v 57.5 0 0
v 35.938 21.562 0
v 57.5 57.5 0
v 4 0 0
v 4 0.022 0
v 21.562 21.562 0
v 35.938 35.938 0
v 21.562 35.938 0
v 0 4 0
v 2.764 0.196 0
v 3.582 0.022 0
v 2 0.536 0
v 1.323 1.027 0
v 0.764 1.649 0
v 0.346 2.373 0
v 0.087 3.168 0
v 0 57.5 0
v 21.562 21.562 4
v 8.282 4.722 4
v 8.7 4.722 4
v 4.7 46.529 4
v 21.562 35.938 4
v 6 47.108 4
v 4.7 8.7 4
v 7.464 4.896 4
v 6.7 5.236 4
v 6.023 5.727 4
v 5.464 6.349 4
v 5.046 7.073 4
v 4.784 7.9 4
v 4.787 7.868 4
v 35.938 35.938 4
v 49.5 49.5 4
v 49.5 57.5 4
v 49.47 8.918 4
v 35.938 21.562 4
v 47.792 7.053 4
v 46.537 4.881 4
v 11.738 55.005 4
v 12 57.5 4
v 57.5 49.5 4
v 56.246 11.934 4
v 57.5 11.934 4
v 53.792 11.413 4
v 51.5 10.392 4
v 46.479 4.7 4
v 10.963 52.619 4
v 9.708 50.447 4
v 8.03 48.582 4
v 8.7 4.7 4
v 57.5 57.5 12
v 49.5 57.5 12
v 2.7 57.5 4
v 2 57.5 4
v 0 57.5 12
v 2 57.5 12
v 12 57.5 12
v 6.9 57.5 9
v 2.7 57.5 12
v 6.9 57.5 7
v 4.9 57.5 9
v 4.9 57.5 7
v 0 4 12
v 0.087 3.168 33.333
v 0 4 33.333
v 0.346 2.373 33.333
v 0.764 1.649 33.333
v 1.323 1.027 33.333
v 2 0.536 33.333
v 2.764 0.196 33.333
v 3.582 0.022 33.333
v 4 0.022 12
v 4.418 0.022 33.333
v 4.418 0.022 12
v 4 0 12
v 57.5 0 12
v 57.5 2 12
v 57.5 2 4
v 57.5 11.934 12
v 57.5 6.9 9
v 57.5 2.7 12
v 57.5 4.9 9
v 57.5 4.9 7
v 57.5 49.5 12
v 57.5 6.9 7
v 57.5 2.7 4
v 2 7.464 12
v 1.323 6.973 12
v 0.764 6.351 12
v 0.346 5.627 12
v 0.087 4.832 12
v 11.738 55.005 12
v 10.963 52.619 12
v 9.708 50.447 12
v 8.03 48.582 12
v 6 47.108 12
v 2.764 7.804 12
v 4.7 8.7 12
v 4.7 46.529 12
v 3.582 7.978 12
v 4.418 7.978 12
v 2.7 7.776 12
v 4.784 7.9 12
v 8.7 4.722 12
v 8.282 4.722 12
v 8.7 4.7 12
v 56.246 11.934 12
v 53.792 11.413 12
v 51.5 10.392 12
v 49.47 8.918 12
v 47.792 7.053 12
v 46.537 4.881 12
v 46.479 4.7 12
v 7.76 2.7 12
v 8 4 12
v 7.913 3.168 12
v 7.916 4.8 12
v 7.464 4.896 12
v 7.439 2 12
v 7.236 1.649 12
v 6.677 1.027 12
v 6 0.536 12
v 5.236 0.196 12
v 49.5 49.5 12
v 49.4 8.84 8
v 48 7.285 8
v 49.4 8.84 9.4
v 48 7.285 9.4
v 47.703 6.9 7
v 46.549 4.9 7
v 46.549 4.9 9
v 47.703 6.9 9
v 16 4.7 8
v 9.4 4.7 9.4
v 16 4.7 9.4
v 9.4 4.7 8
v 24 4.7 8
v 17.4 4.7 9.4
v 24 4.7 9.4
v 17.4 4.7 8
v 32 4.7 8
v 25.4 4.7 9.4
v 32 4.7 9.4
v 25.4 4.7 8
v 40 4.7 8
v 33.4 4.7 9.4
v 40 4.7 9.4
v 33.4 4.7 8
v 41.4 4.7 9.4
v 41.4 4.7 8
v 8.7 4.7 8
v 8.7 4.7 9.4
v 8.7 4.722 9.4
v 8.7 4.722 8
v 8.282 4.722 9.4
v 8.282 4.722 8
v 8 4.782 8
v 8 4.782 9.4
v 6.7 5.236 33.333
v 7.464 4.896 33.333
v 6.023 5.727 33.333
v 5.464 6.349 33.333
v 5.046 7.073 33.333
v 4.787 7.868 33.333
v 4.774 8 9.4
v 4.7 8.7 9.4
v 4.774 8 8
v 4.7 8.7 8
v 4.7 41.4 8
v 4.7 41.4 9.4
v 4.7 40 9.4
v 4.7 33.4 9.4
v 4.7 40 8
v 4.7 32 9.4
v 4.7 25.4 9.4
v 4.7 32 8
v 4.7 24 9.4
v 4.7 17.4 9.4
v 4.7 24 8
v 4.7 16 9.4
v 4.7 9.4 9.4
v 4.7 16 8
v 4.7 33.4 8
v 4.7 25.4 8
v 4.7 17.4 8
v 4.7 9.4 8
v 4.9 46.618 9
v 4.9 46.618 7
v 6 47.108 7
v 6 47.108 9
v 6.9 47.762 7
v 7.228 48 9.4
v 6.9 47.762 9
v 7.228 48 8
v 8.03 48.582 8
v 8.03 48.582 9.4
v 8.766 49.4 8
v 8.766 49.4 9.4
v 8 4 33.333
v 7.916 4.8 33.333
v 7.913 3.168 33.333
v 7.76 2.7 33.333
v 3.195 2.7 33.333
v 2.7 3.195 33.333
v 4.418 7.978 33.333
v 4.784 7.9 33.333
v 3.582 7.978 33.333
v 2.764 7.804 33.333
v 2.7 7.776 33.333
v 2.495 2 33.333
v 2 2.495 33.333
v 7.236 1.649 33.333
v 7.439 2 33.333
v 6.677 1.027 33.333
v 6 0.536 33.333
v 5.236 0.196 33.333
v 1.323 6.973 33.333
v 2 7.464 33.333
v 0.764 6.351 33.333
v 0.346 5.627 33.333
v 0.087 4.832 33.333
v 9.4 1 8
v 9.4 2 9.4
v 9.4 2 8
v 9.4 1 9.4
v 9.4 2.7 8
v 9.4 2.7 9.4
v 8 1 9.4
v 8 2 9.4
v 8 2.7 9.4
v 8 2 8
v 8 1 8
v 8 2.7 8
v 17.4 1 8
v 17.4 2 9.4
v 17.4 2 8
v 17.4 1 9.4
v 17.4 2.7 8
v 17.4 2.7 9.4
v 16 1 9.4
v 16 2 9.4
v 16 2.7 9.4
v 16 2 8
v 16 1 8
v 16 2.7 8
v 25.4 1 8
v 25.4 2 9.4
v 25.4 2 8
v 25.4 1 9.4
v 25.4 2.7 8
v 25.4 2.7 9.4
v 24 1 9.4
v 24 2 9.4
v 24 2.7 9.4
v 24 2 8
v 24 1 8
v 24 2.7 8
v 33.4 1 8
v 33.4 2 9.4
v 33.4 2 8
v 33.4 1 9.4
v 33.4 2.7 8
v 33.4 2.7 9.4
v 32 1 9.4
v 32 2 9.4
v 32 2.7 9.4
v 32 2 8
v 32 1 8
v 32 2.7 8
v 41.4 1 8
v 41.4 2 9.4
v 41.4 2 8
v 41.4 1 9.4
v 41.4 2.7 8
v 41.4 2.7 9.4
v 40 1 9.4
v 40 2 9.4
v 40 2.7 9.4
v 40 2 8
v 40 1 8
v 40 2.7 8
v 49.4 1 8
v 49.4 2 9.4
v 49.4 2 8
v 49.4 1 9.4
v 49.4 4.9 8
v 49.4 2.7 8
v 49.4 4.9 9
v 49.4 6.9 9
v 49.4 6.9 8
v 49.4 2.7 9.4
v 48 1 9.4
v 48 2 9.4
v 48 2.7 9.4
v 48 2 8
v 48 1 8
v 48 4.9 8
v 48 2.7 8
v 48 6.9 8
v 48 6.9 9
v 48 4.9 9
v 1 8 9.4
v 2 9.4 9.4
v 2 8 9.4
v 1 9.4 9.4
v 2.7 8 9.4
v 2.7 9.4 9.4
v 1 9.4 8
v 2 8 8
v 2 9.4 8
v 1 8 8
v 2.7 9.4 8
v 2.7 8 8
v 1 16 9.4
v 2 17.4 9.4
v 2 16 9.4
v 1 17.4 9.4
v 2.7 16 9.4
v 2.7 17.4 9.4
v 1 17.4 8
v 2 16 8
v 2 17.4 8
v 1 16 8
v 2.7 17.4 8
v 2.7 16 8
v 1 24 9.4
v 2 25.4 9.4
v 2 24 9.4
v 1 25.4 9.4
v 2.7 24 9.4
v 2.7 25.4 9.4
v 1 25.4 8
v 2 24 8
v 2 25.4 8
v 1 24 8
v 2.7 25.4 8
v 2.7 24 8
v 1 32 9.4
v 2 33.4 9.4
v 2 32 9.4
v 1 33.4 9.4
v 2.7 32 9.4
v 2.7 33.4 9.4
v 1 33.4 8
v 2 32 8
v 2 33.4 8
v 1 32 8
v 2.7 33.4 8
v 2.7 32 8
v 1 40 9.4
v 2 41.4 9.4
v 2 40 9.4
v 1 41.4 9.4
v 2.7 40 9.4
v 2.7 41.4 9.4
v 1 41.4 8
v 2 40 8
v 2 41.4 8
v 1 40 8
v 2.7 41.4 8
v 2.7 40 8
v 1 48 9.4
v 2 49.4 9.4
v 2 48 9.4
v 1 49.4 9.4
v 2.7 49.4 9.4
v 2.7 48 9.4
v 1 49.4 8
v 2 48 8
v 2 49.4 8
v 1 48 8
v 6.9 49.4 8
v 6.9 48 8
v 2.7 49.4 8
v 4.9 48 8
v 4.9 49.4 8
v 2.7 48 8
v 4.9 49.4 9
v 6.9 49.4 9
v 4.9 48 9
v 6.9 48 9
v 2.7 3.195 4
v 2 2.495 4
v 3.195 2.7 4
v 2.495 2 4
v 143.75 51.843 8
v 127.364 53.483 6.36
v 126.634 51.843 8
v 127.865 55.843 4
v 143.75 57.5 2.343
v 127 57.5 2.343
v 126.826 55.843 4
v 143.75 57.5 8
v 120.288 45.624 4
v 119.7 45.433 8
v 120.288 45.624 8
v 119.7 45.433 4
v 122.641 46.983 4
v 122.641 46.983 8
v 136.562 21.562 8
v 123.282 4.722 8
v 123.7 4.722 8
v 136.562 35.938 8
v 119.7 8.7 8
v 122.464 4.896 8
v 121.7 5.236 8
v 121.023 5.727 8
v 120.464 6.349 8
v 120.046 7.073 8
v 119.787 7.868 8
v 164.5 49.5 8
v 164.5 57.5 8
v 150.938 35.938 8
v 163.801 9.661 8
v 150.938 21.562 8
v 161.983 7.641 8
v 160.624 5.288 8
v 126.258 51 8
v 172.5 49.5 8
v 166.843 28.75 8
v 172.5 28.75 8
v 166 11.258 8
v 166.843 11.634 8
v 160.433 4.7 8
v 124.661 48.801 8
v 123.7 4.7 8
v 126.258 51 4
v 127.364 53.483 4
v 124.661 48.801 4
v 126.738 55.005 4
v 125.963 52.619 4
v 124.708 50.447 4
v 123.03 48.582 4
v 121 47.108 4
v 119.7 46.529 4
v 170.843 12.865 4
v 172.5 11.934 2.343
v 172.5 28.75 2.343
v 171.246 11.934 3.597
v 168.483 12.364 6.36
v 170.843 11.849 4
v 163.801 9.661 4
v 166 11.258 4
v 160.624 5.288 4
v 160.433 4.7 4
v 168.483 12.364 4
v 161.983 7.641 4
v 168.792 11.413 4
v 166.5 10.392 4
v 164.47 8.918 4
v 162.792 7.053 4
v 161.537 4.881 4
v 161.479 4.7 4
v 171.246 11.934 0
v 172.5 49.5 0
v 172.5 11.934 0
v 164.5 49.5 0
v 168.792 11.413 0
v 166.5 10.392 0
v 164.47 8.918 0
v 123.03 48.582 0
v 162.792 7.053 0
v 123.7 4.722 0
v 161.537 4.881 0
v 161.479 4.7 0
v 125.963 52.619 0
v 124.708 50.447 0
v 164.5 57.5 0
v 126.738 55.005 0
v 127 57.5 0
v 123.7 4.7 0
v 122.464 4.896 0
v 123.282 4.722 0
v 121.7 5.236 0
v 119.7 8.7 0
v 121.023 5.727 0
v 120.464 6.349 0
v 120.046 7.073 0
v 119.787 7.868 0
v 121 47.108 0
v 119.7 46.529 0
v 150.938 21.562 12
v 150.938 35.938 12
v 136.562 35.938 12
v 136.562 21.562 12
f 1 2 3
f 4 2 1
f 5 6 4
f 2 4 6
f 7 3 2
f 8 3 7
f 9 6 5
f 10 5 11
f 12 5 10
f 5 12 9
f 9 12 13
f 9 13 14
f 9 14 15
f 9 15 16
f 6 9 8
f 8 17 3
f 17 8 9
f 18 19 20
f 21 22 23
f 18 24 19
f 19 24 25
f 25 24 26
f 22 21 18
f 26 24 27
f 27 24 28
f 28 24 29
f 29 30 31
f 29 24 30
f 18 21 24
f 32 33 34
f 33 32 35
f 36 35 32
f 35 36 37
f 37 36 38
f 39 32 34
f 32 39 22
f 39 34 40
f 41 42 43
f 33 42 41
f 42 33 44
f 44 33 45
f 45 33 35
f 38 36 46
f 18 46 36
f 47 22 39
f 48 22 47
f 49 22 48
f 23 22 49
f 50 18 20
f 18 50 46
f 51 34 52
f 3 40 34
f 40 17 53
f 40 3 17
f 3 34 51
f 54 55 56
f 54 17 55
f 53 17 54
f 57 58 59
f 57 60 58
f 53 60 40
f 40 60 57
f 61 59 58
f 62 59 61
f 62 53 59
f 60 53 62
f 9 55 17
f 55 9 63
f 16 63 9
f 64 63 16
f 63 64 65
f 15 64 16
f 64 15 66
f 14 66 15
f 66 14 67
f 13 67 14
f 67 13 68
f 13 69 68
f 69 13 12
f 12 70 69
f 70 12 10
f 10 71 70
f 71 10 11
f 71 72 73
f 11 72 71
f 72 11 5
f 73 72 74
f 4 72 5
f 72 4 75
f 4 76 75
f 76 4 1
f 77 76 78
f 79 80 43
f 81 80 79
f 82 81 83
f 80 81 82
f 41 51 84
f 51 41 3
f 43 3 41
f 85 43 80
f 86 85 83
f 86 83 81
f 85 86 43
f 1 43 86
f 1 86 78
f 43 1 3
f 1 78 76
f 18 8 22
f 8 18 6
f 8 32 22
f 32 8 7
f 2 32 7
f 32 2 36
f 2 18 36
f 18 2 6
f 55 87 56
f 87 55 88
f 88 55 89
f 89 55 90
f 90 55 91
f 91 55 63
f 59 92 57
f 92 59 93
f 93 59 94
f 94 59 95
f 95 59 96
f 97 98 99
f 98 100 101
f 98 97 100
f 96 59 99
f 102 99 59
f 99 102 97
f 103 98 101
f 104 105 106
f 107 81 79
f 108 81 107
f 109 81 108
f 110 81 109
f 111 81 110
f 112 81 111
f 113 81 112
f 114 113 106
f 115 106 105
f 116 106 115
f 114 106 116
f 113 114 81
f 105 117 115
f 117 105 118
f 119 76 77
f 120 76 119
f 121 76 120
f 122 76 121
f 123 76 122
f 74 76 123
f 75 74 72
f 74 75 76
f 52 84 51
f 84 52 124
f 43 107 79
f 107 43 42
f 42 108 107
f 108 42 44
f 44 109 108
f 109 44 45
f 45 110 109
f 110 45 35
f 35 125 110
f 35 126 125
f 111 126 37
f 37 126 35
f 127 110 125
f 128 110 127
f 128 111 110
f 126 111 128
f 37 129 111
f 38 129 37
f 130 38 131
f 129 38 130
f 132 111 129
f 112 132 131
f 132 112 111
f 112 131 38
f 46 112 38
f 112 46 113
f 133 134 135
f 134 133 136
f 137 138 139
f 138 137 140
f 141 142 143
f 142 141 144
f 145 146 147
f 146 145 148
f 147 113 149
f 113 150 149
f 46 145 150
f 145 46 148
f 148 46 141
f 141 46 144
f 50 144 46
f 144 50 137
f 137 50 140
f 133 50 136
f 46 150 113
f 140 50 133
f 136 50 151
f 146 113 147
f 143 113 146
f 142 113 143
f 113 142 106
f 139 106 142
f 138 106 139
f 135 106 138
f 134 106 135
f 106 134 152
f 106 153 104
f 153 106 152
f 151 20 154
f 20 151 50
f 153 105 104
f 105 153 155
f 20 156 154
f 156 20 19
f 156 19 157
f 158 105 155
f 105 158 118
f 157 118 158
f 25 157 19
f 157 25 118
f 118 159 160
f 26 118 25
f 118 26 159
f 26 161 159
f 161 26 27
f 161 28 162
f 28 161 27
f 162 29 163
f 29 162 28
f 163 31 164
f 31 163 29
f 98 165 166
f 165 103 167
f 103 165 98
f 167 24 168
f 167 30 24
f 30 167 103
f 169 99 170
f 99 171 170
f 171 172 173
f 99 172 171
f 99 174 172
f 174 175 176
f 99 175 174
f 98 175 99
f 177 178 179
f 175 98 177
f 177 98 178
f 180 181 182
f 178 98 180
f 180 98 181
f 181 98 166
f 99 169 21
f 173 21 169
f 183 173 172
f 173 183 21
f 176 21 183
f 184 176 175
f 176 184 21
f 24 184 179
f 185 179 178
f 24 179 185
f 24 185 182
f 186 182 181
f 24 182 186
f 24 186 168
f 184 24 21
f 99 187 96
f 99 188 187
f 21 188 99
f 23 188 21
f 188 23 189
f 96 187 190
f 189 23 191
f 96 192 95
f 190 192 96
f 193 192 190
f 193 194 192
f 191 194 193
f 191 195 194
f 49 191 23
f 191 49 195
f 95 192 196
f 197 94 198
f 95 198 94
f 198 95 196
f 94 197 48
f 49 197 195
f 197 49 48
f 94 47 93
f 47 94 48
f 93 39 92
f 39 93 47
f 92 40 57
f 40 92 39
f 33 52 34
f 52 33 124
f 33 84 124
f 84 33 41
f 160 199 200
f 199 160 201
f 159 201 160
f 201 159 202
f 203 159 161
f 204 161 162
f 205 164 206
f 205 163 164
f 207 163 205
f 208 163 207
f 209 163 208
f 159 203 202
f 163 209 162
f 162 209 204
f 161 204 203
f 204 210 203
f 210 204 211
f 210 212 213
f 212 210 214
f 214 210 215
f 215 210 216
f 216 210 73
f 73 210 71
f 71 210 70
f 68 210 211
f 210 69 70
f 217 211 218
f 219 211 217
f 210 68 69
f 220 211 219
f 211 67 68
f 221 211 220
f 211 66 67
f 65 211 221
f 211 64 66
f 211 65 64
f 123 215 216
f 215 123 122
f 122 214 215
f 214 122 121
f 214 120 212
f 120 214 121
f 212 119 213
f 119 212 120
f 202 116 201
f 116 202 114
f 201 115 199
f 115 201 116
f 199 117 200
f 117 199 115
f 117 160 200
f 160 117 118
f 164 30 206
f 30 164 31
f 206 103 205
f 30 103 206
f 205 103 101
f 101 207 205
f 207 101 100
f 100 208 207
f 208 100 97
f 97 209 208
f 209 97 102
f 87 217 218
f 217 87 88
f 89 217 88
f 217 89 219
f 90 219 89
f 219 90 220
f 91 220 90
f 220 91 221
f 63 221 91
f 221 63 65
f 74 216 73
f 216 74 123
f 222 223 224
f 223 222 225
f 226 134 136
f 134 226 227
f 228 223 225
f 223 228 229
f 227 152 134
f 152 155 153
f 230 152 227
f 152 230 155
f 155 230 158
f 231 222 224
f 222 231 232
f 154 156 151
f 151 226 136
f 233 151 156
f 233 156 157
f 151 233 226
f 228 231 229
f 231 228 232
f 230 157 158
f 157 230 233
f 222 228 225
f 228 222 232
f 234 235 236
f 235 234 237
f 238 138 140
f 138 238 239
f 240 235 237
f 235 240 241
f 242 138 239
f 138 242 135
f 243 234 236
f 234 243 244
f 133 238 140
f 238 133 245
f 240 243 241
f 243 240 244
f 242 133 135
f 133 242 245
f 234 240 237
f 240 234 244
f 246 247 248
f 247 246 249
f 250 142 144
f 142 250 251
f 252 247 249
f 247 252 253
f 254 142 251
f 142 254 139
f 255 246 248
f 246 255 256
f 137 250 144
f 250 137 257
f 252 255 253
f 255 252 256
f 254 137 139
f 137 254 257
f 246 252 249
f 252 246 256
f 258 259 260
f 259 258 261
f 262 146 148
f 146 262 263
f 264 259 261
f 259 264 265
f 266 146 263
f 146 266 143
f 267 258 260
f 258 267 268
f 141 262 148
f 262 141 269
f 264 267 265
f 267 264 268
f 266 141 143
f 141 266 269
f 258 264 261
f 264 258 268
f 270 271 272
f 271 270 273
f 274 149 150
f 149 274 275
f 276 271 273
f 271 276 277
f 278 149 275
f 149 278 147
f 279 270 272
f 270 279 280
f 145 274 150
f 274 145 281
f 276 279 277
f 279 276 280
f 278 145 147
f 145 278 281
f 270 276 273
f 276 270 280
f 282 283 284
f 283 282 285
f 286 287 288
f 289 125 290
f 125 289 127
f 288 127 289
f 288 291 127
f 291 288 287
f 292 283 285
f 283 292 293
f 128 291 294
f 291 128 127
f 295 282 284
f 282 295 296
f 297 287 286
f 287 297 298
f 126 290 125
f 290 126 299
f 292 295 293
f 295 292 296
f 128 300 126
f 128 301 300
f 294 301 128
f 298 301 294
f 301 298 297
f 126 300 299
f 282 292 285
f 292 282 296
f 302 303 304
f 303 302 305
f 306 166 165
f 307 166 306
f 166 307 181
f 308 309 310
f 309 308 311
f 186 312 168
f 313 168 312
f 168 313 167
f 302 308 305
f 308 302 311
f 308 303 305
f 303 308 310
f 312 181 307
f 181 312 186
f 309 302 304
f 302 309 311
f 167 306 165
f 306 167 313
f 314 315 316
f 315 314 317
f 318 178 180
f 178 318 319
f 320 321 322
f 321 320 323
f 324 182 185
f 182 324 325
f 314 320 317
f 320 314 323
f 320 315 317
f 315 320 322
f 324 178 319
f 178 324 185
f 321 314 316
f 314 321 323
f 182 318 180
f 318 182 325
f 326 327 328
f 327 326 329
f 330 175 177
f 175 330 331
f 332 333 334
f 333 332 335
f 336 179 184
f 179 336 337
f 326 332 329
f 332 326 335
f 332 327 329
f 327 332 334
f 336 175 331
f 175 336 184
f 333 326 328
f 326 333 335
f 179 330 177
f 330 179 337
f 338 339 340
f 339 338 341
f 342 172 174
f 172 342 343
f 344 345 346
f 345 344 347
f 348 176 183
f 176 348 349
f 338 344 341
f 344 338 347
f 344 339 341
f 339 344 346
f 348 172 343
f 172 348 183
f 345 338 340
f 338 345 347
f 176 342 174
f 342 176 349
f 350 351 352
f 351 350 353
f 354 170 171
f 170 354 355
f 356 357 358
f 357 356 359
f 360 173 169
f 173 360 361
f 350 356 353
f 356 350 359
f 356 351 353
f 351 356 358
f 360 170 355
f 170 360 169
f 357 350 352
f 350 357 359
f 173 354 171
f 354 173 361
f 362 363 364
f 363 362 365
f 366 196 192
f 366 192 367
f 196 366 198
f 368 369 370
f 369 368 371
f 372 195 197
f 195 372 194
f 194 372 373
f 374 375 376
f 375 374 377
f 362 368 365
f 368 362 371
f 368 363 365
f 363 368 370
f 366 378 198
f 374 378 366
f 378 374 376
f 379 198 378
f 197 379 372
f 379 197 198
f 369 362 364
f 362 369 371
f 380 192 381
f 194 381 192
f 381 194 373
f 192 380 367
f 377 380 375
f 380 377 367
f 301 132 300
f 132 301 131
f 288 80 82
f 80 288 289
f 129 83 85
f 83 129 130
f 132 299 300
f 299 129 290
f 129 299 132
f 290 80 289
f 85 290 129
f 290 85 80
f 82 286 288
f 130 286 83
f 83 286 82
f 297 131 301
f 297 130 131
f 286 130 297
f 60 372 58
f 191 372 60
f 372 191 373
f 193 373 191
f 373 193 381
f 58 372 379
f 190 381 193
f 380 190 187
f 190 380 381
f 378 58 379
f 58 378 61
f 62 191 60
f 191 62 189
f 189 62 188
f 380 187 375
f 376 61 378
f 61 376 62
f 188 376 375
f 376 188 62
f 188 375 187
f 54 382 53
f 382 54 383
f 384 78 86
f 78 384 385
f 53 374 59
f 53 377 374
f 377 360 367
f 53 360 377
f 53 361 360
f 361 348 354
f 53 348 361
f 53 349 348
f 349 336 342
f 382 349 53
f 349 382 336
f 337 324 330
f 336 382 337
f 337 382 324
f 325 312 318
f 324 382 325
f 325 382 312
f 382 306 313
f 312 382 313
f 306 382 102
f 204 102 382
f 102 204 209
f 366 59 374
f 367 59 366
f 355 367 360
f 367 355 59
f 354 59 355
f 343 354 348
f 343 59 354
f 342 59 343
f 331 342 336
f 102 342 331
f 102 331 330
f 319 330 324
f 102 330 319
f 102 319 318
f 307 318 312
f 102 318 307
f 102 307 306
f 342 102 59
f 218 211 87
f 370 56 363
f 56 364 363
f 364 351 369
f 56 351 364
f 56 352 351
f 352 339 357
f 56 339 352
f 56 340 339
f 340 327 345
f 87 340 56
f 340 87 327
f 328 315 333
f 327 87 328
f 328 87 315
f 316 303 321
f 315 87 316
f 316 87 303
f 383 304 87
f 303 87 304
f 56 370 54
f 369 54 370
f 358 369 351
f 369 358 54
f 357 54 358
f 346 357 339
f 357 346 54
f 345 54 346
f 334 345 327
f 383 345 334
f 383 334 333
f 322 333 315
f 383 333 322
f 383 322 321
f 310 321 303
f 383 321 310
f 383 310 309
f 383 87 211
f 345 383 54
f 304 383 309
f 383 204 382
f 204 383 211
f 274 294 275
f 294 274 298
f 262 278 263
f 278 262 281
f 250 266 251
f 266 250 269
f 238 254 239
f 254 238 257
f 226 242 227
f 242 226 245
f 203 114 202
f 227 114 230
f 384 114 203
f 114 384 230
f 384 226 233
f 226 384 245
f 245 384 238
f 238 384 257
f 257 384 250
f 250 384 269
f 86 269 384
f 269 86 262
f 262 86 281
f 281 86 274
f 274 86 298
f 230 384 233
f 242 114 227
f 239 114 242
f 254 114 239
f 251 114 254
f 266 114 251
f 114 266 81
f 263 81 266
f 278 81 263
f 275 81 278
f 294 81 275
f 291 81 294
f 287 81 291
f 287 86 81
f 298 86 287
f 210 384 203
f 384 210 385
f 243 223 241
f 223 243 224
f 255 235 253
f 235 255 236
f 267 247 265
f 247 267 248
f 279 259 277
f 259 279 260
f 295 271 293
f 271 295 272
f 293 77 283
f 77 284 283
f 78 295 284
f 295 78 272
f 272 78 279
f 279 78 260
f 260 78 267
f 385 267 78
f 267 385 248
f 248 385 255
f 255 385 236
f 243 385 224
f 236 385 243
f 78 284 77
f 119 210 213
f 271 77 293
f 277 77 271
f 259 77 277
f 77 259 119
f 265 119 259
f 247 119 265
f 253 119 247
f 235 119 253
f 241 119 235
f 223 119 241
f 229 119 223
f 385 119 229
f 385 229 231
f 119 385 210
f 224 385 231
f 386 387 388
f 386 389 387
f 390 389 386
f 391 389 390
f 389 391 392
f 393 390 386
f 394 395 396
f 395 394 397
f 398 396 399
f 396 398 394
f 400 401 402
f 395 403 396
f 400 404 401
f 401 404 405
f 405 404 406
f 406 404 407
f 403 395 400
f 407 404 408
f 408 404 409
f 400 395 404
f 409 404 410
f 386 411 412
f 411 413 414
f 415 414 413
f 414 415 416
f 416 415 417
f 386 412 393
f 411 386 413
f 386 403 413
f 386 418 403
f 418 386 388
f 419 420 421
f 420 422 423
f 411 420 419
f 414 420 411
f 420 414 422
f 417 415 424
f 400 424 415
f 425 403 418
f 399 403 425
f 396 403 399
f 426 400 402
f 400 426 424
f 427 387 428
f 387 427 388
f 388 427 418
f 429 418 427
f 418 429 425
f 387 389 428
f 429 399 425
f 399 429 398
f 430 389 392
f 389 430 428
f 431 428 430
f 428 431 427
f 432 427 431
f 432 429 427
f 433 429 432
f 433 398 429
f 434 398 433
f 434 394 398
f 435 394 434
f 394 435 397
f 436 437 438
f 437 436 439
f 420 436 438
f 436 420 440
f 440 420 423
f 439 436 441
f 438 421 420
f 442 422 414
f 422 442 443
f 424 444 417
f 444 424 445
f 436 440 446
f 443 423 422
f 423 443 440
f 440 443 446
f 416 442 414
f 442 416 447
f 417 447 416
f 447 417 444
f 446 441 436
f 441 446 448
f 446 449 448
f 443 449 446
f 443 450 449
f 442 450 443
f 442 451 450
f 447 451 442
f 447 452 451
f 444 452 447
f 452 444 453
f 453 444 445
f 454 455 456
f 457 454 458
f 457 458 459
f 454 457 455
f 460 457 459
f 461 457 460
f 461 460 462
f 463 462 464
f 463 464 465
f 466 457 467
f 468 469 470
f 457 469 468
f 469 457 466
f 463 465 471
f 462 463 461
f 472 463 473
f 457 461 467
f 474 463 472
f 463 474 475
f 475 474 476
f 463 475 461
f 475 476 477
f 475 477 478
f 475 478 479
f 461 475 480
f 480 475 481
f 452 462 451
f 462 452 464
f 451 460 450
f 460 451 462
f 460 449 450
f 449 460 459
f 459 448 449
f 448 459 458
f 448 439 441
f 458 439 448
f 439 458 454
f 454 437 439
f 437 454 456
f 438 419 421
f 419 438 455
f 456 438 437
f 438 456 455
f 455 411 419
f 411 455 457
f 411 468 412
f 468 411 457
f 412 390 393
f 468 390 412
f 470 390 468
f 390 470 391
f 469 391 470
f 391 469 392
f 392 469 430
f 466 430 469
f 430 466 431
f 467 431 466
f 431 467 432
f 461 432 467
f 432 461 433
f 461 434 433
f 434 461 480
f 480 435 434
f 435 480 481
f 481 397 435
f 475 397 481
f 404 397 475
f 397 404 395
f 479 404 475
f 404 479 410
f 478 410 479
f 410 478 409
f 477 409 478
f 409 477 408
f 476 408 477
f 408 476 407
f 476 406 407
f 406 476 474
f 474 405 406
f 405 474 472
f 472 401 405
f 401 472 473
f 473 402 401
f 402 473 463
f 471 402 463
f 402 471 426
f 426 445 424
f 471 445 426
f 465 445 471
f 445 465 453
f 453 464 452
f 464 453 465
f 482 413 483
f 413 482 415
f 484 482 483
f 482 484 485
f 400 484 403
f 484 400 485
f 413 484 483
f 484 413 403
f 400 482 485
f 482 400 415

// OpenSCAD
//
//  Copyright (C) 19-06-2013 Jasper den Ouden.(ojasper.nl)
//
//  This is free software: you can redistribute it and/or modify
//  it under the terms of the GNU General Public License as published
//  by the Free Software Foundation, either version 3 of the License, or
//  (at your option) any later version.
//

$fs=0.5;
t = 4;
w = 115;

pt=0.7;
wr=1;

h=100;

//TODO plate space, corners and top.

module quarter2d()
{   union()
    {   translate([t,t]) circle(t);
        translate([t,0]) square([w/2-t,w/2]);
        translate([0,t]) square([w/2,w/2-t]);
    }
}

module floor_sub()
{
    difference()
    {   intersection()
        {   quarter2d();
            translate([t+pt,t+pt]) quarter2d();
        }
        translate([w/2,0]) circle(3*t);
        translate([0,w/2]) circle(3*t);
        translate([w/2-2*t,w/2-2*t]) square(3*[t,t]);
    }
}

module bottom_section()
{
    difference()
    {   union()
        {   linear_extrude(height=t) difference() //With hole for floor.
            { quarter2d(); translate(1.5*[w,w]/8) square([w,w]/8); }
            linear_extrude(height=3*t) difference()
            {   quarter2d();
                floor_sub();
            }
            linear_extrude(height=h/3) difference()
            {   translate([t,t]) circle(t);
                translate([2*t+pt,2*t+pt]) circle(t);
            }
        }
        translate([w/2,t+pt+1.2*wr,2*t]) cube([w/2,2*wr,2*wr],center=true);
        translate([t+pt+1.2*wr,w/2,2*t]) cube([2*wr,w/2,2*wr],center=true);

        translate([0,0,t]) linear_extrude(height=h) difference()
        {   union()
            {   translate([t/2,t/2]) square([pt,w]);
                translate([t/2,t/2]) square([w,pt]);
            }
            rotate(-45) square([pt,w],center=true);
        }
        for( x = [ 2*t : 2*t : w/2-2*t] ) translate([x,t/4,2*t]) cube(2*[pt,t,pt]);
        for( y = [ 2*t : 2*t : w/2-2*t] ) translate([t/4,y,2*t]) cube(2*[t,pt,pt]);
    }
}

module corner_section(h=h/3)
{
    translate([0,0,t]) linear_extrude(height=h) difference()
    {   translate([t,t]) circle(t);
        translate([2*t+pt,2*t+pt]) circle(t);        
        difference()
        {   union()
            {   translate([t/2,t/2]) square([pt,w]);
                translate([t/2,t/2]) square([w,pt]);
            }
            rotate(-45) square([pt,w],center=true);
        }
    }
}
//corner_section();
bottom_section();
module floor_section()
{
    difference()
    {   linear_extrude(height=2*t) floor_sub();
        translate([w/2,w/2,2*t]) 
            for(a=[-90,0]) rotate(a) union()
            {   rotate([90,0,0]) translate([0,0,w/4]) cylinder(r=sqrt(2)*t,h=w, $fn=4);
                translate([0,-w/2,-t]) cylinder(r=3*t+wr,h=t);
            }
        
    }
    translate(1.5*[w,w]/8) cube([w/8,w/8,3*t]);
}

translate([w,0]) floor_section();
